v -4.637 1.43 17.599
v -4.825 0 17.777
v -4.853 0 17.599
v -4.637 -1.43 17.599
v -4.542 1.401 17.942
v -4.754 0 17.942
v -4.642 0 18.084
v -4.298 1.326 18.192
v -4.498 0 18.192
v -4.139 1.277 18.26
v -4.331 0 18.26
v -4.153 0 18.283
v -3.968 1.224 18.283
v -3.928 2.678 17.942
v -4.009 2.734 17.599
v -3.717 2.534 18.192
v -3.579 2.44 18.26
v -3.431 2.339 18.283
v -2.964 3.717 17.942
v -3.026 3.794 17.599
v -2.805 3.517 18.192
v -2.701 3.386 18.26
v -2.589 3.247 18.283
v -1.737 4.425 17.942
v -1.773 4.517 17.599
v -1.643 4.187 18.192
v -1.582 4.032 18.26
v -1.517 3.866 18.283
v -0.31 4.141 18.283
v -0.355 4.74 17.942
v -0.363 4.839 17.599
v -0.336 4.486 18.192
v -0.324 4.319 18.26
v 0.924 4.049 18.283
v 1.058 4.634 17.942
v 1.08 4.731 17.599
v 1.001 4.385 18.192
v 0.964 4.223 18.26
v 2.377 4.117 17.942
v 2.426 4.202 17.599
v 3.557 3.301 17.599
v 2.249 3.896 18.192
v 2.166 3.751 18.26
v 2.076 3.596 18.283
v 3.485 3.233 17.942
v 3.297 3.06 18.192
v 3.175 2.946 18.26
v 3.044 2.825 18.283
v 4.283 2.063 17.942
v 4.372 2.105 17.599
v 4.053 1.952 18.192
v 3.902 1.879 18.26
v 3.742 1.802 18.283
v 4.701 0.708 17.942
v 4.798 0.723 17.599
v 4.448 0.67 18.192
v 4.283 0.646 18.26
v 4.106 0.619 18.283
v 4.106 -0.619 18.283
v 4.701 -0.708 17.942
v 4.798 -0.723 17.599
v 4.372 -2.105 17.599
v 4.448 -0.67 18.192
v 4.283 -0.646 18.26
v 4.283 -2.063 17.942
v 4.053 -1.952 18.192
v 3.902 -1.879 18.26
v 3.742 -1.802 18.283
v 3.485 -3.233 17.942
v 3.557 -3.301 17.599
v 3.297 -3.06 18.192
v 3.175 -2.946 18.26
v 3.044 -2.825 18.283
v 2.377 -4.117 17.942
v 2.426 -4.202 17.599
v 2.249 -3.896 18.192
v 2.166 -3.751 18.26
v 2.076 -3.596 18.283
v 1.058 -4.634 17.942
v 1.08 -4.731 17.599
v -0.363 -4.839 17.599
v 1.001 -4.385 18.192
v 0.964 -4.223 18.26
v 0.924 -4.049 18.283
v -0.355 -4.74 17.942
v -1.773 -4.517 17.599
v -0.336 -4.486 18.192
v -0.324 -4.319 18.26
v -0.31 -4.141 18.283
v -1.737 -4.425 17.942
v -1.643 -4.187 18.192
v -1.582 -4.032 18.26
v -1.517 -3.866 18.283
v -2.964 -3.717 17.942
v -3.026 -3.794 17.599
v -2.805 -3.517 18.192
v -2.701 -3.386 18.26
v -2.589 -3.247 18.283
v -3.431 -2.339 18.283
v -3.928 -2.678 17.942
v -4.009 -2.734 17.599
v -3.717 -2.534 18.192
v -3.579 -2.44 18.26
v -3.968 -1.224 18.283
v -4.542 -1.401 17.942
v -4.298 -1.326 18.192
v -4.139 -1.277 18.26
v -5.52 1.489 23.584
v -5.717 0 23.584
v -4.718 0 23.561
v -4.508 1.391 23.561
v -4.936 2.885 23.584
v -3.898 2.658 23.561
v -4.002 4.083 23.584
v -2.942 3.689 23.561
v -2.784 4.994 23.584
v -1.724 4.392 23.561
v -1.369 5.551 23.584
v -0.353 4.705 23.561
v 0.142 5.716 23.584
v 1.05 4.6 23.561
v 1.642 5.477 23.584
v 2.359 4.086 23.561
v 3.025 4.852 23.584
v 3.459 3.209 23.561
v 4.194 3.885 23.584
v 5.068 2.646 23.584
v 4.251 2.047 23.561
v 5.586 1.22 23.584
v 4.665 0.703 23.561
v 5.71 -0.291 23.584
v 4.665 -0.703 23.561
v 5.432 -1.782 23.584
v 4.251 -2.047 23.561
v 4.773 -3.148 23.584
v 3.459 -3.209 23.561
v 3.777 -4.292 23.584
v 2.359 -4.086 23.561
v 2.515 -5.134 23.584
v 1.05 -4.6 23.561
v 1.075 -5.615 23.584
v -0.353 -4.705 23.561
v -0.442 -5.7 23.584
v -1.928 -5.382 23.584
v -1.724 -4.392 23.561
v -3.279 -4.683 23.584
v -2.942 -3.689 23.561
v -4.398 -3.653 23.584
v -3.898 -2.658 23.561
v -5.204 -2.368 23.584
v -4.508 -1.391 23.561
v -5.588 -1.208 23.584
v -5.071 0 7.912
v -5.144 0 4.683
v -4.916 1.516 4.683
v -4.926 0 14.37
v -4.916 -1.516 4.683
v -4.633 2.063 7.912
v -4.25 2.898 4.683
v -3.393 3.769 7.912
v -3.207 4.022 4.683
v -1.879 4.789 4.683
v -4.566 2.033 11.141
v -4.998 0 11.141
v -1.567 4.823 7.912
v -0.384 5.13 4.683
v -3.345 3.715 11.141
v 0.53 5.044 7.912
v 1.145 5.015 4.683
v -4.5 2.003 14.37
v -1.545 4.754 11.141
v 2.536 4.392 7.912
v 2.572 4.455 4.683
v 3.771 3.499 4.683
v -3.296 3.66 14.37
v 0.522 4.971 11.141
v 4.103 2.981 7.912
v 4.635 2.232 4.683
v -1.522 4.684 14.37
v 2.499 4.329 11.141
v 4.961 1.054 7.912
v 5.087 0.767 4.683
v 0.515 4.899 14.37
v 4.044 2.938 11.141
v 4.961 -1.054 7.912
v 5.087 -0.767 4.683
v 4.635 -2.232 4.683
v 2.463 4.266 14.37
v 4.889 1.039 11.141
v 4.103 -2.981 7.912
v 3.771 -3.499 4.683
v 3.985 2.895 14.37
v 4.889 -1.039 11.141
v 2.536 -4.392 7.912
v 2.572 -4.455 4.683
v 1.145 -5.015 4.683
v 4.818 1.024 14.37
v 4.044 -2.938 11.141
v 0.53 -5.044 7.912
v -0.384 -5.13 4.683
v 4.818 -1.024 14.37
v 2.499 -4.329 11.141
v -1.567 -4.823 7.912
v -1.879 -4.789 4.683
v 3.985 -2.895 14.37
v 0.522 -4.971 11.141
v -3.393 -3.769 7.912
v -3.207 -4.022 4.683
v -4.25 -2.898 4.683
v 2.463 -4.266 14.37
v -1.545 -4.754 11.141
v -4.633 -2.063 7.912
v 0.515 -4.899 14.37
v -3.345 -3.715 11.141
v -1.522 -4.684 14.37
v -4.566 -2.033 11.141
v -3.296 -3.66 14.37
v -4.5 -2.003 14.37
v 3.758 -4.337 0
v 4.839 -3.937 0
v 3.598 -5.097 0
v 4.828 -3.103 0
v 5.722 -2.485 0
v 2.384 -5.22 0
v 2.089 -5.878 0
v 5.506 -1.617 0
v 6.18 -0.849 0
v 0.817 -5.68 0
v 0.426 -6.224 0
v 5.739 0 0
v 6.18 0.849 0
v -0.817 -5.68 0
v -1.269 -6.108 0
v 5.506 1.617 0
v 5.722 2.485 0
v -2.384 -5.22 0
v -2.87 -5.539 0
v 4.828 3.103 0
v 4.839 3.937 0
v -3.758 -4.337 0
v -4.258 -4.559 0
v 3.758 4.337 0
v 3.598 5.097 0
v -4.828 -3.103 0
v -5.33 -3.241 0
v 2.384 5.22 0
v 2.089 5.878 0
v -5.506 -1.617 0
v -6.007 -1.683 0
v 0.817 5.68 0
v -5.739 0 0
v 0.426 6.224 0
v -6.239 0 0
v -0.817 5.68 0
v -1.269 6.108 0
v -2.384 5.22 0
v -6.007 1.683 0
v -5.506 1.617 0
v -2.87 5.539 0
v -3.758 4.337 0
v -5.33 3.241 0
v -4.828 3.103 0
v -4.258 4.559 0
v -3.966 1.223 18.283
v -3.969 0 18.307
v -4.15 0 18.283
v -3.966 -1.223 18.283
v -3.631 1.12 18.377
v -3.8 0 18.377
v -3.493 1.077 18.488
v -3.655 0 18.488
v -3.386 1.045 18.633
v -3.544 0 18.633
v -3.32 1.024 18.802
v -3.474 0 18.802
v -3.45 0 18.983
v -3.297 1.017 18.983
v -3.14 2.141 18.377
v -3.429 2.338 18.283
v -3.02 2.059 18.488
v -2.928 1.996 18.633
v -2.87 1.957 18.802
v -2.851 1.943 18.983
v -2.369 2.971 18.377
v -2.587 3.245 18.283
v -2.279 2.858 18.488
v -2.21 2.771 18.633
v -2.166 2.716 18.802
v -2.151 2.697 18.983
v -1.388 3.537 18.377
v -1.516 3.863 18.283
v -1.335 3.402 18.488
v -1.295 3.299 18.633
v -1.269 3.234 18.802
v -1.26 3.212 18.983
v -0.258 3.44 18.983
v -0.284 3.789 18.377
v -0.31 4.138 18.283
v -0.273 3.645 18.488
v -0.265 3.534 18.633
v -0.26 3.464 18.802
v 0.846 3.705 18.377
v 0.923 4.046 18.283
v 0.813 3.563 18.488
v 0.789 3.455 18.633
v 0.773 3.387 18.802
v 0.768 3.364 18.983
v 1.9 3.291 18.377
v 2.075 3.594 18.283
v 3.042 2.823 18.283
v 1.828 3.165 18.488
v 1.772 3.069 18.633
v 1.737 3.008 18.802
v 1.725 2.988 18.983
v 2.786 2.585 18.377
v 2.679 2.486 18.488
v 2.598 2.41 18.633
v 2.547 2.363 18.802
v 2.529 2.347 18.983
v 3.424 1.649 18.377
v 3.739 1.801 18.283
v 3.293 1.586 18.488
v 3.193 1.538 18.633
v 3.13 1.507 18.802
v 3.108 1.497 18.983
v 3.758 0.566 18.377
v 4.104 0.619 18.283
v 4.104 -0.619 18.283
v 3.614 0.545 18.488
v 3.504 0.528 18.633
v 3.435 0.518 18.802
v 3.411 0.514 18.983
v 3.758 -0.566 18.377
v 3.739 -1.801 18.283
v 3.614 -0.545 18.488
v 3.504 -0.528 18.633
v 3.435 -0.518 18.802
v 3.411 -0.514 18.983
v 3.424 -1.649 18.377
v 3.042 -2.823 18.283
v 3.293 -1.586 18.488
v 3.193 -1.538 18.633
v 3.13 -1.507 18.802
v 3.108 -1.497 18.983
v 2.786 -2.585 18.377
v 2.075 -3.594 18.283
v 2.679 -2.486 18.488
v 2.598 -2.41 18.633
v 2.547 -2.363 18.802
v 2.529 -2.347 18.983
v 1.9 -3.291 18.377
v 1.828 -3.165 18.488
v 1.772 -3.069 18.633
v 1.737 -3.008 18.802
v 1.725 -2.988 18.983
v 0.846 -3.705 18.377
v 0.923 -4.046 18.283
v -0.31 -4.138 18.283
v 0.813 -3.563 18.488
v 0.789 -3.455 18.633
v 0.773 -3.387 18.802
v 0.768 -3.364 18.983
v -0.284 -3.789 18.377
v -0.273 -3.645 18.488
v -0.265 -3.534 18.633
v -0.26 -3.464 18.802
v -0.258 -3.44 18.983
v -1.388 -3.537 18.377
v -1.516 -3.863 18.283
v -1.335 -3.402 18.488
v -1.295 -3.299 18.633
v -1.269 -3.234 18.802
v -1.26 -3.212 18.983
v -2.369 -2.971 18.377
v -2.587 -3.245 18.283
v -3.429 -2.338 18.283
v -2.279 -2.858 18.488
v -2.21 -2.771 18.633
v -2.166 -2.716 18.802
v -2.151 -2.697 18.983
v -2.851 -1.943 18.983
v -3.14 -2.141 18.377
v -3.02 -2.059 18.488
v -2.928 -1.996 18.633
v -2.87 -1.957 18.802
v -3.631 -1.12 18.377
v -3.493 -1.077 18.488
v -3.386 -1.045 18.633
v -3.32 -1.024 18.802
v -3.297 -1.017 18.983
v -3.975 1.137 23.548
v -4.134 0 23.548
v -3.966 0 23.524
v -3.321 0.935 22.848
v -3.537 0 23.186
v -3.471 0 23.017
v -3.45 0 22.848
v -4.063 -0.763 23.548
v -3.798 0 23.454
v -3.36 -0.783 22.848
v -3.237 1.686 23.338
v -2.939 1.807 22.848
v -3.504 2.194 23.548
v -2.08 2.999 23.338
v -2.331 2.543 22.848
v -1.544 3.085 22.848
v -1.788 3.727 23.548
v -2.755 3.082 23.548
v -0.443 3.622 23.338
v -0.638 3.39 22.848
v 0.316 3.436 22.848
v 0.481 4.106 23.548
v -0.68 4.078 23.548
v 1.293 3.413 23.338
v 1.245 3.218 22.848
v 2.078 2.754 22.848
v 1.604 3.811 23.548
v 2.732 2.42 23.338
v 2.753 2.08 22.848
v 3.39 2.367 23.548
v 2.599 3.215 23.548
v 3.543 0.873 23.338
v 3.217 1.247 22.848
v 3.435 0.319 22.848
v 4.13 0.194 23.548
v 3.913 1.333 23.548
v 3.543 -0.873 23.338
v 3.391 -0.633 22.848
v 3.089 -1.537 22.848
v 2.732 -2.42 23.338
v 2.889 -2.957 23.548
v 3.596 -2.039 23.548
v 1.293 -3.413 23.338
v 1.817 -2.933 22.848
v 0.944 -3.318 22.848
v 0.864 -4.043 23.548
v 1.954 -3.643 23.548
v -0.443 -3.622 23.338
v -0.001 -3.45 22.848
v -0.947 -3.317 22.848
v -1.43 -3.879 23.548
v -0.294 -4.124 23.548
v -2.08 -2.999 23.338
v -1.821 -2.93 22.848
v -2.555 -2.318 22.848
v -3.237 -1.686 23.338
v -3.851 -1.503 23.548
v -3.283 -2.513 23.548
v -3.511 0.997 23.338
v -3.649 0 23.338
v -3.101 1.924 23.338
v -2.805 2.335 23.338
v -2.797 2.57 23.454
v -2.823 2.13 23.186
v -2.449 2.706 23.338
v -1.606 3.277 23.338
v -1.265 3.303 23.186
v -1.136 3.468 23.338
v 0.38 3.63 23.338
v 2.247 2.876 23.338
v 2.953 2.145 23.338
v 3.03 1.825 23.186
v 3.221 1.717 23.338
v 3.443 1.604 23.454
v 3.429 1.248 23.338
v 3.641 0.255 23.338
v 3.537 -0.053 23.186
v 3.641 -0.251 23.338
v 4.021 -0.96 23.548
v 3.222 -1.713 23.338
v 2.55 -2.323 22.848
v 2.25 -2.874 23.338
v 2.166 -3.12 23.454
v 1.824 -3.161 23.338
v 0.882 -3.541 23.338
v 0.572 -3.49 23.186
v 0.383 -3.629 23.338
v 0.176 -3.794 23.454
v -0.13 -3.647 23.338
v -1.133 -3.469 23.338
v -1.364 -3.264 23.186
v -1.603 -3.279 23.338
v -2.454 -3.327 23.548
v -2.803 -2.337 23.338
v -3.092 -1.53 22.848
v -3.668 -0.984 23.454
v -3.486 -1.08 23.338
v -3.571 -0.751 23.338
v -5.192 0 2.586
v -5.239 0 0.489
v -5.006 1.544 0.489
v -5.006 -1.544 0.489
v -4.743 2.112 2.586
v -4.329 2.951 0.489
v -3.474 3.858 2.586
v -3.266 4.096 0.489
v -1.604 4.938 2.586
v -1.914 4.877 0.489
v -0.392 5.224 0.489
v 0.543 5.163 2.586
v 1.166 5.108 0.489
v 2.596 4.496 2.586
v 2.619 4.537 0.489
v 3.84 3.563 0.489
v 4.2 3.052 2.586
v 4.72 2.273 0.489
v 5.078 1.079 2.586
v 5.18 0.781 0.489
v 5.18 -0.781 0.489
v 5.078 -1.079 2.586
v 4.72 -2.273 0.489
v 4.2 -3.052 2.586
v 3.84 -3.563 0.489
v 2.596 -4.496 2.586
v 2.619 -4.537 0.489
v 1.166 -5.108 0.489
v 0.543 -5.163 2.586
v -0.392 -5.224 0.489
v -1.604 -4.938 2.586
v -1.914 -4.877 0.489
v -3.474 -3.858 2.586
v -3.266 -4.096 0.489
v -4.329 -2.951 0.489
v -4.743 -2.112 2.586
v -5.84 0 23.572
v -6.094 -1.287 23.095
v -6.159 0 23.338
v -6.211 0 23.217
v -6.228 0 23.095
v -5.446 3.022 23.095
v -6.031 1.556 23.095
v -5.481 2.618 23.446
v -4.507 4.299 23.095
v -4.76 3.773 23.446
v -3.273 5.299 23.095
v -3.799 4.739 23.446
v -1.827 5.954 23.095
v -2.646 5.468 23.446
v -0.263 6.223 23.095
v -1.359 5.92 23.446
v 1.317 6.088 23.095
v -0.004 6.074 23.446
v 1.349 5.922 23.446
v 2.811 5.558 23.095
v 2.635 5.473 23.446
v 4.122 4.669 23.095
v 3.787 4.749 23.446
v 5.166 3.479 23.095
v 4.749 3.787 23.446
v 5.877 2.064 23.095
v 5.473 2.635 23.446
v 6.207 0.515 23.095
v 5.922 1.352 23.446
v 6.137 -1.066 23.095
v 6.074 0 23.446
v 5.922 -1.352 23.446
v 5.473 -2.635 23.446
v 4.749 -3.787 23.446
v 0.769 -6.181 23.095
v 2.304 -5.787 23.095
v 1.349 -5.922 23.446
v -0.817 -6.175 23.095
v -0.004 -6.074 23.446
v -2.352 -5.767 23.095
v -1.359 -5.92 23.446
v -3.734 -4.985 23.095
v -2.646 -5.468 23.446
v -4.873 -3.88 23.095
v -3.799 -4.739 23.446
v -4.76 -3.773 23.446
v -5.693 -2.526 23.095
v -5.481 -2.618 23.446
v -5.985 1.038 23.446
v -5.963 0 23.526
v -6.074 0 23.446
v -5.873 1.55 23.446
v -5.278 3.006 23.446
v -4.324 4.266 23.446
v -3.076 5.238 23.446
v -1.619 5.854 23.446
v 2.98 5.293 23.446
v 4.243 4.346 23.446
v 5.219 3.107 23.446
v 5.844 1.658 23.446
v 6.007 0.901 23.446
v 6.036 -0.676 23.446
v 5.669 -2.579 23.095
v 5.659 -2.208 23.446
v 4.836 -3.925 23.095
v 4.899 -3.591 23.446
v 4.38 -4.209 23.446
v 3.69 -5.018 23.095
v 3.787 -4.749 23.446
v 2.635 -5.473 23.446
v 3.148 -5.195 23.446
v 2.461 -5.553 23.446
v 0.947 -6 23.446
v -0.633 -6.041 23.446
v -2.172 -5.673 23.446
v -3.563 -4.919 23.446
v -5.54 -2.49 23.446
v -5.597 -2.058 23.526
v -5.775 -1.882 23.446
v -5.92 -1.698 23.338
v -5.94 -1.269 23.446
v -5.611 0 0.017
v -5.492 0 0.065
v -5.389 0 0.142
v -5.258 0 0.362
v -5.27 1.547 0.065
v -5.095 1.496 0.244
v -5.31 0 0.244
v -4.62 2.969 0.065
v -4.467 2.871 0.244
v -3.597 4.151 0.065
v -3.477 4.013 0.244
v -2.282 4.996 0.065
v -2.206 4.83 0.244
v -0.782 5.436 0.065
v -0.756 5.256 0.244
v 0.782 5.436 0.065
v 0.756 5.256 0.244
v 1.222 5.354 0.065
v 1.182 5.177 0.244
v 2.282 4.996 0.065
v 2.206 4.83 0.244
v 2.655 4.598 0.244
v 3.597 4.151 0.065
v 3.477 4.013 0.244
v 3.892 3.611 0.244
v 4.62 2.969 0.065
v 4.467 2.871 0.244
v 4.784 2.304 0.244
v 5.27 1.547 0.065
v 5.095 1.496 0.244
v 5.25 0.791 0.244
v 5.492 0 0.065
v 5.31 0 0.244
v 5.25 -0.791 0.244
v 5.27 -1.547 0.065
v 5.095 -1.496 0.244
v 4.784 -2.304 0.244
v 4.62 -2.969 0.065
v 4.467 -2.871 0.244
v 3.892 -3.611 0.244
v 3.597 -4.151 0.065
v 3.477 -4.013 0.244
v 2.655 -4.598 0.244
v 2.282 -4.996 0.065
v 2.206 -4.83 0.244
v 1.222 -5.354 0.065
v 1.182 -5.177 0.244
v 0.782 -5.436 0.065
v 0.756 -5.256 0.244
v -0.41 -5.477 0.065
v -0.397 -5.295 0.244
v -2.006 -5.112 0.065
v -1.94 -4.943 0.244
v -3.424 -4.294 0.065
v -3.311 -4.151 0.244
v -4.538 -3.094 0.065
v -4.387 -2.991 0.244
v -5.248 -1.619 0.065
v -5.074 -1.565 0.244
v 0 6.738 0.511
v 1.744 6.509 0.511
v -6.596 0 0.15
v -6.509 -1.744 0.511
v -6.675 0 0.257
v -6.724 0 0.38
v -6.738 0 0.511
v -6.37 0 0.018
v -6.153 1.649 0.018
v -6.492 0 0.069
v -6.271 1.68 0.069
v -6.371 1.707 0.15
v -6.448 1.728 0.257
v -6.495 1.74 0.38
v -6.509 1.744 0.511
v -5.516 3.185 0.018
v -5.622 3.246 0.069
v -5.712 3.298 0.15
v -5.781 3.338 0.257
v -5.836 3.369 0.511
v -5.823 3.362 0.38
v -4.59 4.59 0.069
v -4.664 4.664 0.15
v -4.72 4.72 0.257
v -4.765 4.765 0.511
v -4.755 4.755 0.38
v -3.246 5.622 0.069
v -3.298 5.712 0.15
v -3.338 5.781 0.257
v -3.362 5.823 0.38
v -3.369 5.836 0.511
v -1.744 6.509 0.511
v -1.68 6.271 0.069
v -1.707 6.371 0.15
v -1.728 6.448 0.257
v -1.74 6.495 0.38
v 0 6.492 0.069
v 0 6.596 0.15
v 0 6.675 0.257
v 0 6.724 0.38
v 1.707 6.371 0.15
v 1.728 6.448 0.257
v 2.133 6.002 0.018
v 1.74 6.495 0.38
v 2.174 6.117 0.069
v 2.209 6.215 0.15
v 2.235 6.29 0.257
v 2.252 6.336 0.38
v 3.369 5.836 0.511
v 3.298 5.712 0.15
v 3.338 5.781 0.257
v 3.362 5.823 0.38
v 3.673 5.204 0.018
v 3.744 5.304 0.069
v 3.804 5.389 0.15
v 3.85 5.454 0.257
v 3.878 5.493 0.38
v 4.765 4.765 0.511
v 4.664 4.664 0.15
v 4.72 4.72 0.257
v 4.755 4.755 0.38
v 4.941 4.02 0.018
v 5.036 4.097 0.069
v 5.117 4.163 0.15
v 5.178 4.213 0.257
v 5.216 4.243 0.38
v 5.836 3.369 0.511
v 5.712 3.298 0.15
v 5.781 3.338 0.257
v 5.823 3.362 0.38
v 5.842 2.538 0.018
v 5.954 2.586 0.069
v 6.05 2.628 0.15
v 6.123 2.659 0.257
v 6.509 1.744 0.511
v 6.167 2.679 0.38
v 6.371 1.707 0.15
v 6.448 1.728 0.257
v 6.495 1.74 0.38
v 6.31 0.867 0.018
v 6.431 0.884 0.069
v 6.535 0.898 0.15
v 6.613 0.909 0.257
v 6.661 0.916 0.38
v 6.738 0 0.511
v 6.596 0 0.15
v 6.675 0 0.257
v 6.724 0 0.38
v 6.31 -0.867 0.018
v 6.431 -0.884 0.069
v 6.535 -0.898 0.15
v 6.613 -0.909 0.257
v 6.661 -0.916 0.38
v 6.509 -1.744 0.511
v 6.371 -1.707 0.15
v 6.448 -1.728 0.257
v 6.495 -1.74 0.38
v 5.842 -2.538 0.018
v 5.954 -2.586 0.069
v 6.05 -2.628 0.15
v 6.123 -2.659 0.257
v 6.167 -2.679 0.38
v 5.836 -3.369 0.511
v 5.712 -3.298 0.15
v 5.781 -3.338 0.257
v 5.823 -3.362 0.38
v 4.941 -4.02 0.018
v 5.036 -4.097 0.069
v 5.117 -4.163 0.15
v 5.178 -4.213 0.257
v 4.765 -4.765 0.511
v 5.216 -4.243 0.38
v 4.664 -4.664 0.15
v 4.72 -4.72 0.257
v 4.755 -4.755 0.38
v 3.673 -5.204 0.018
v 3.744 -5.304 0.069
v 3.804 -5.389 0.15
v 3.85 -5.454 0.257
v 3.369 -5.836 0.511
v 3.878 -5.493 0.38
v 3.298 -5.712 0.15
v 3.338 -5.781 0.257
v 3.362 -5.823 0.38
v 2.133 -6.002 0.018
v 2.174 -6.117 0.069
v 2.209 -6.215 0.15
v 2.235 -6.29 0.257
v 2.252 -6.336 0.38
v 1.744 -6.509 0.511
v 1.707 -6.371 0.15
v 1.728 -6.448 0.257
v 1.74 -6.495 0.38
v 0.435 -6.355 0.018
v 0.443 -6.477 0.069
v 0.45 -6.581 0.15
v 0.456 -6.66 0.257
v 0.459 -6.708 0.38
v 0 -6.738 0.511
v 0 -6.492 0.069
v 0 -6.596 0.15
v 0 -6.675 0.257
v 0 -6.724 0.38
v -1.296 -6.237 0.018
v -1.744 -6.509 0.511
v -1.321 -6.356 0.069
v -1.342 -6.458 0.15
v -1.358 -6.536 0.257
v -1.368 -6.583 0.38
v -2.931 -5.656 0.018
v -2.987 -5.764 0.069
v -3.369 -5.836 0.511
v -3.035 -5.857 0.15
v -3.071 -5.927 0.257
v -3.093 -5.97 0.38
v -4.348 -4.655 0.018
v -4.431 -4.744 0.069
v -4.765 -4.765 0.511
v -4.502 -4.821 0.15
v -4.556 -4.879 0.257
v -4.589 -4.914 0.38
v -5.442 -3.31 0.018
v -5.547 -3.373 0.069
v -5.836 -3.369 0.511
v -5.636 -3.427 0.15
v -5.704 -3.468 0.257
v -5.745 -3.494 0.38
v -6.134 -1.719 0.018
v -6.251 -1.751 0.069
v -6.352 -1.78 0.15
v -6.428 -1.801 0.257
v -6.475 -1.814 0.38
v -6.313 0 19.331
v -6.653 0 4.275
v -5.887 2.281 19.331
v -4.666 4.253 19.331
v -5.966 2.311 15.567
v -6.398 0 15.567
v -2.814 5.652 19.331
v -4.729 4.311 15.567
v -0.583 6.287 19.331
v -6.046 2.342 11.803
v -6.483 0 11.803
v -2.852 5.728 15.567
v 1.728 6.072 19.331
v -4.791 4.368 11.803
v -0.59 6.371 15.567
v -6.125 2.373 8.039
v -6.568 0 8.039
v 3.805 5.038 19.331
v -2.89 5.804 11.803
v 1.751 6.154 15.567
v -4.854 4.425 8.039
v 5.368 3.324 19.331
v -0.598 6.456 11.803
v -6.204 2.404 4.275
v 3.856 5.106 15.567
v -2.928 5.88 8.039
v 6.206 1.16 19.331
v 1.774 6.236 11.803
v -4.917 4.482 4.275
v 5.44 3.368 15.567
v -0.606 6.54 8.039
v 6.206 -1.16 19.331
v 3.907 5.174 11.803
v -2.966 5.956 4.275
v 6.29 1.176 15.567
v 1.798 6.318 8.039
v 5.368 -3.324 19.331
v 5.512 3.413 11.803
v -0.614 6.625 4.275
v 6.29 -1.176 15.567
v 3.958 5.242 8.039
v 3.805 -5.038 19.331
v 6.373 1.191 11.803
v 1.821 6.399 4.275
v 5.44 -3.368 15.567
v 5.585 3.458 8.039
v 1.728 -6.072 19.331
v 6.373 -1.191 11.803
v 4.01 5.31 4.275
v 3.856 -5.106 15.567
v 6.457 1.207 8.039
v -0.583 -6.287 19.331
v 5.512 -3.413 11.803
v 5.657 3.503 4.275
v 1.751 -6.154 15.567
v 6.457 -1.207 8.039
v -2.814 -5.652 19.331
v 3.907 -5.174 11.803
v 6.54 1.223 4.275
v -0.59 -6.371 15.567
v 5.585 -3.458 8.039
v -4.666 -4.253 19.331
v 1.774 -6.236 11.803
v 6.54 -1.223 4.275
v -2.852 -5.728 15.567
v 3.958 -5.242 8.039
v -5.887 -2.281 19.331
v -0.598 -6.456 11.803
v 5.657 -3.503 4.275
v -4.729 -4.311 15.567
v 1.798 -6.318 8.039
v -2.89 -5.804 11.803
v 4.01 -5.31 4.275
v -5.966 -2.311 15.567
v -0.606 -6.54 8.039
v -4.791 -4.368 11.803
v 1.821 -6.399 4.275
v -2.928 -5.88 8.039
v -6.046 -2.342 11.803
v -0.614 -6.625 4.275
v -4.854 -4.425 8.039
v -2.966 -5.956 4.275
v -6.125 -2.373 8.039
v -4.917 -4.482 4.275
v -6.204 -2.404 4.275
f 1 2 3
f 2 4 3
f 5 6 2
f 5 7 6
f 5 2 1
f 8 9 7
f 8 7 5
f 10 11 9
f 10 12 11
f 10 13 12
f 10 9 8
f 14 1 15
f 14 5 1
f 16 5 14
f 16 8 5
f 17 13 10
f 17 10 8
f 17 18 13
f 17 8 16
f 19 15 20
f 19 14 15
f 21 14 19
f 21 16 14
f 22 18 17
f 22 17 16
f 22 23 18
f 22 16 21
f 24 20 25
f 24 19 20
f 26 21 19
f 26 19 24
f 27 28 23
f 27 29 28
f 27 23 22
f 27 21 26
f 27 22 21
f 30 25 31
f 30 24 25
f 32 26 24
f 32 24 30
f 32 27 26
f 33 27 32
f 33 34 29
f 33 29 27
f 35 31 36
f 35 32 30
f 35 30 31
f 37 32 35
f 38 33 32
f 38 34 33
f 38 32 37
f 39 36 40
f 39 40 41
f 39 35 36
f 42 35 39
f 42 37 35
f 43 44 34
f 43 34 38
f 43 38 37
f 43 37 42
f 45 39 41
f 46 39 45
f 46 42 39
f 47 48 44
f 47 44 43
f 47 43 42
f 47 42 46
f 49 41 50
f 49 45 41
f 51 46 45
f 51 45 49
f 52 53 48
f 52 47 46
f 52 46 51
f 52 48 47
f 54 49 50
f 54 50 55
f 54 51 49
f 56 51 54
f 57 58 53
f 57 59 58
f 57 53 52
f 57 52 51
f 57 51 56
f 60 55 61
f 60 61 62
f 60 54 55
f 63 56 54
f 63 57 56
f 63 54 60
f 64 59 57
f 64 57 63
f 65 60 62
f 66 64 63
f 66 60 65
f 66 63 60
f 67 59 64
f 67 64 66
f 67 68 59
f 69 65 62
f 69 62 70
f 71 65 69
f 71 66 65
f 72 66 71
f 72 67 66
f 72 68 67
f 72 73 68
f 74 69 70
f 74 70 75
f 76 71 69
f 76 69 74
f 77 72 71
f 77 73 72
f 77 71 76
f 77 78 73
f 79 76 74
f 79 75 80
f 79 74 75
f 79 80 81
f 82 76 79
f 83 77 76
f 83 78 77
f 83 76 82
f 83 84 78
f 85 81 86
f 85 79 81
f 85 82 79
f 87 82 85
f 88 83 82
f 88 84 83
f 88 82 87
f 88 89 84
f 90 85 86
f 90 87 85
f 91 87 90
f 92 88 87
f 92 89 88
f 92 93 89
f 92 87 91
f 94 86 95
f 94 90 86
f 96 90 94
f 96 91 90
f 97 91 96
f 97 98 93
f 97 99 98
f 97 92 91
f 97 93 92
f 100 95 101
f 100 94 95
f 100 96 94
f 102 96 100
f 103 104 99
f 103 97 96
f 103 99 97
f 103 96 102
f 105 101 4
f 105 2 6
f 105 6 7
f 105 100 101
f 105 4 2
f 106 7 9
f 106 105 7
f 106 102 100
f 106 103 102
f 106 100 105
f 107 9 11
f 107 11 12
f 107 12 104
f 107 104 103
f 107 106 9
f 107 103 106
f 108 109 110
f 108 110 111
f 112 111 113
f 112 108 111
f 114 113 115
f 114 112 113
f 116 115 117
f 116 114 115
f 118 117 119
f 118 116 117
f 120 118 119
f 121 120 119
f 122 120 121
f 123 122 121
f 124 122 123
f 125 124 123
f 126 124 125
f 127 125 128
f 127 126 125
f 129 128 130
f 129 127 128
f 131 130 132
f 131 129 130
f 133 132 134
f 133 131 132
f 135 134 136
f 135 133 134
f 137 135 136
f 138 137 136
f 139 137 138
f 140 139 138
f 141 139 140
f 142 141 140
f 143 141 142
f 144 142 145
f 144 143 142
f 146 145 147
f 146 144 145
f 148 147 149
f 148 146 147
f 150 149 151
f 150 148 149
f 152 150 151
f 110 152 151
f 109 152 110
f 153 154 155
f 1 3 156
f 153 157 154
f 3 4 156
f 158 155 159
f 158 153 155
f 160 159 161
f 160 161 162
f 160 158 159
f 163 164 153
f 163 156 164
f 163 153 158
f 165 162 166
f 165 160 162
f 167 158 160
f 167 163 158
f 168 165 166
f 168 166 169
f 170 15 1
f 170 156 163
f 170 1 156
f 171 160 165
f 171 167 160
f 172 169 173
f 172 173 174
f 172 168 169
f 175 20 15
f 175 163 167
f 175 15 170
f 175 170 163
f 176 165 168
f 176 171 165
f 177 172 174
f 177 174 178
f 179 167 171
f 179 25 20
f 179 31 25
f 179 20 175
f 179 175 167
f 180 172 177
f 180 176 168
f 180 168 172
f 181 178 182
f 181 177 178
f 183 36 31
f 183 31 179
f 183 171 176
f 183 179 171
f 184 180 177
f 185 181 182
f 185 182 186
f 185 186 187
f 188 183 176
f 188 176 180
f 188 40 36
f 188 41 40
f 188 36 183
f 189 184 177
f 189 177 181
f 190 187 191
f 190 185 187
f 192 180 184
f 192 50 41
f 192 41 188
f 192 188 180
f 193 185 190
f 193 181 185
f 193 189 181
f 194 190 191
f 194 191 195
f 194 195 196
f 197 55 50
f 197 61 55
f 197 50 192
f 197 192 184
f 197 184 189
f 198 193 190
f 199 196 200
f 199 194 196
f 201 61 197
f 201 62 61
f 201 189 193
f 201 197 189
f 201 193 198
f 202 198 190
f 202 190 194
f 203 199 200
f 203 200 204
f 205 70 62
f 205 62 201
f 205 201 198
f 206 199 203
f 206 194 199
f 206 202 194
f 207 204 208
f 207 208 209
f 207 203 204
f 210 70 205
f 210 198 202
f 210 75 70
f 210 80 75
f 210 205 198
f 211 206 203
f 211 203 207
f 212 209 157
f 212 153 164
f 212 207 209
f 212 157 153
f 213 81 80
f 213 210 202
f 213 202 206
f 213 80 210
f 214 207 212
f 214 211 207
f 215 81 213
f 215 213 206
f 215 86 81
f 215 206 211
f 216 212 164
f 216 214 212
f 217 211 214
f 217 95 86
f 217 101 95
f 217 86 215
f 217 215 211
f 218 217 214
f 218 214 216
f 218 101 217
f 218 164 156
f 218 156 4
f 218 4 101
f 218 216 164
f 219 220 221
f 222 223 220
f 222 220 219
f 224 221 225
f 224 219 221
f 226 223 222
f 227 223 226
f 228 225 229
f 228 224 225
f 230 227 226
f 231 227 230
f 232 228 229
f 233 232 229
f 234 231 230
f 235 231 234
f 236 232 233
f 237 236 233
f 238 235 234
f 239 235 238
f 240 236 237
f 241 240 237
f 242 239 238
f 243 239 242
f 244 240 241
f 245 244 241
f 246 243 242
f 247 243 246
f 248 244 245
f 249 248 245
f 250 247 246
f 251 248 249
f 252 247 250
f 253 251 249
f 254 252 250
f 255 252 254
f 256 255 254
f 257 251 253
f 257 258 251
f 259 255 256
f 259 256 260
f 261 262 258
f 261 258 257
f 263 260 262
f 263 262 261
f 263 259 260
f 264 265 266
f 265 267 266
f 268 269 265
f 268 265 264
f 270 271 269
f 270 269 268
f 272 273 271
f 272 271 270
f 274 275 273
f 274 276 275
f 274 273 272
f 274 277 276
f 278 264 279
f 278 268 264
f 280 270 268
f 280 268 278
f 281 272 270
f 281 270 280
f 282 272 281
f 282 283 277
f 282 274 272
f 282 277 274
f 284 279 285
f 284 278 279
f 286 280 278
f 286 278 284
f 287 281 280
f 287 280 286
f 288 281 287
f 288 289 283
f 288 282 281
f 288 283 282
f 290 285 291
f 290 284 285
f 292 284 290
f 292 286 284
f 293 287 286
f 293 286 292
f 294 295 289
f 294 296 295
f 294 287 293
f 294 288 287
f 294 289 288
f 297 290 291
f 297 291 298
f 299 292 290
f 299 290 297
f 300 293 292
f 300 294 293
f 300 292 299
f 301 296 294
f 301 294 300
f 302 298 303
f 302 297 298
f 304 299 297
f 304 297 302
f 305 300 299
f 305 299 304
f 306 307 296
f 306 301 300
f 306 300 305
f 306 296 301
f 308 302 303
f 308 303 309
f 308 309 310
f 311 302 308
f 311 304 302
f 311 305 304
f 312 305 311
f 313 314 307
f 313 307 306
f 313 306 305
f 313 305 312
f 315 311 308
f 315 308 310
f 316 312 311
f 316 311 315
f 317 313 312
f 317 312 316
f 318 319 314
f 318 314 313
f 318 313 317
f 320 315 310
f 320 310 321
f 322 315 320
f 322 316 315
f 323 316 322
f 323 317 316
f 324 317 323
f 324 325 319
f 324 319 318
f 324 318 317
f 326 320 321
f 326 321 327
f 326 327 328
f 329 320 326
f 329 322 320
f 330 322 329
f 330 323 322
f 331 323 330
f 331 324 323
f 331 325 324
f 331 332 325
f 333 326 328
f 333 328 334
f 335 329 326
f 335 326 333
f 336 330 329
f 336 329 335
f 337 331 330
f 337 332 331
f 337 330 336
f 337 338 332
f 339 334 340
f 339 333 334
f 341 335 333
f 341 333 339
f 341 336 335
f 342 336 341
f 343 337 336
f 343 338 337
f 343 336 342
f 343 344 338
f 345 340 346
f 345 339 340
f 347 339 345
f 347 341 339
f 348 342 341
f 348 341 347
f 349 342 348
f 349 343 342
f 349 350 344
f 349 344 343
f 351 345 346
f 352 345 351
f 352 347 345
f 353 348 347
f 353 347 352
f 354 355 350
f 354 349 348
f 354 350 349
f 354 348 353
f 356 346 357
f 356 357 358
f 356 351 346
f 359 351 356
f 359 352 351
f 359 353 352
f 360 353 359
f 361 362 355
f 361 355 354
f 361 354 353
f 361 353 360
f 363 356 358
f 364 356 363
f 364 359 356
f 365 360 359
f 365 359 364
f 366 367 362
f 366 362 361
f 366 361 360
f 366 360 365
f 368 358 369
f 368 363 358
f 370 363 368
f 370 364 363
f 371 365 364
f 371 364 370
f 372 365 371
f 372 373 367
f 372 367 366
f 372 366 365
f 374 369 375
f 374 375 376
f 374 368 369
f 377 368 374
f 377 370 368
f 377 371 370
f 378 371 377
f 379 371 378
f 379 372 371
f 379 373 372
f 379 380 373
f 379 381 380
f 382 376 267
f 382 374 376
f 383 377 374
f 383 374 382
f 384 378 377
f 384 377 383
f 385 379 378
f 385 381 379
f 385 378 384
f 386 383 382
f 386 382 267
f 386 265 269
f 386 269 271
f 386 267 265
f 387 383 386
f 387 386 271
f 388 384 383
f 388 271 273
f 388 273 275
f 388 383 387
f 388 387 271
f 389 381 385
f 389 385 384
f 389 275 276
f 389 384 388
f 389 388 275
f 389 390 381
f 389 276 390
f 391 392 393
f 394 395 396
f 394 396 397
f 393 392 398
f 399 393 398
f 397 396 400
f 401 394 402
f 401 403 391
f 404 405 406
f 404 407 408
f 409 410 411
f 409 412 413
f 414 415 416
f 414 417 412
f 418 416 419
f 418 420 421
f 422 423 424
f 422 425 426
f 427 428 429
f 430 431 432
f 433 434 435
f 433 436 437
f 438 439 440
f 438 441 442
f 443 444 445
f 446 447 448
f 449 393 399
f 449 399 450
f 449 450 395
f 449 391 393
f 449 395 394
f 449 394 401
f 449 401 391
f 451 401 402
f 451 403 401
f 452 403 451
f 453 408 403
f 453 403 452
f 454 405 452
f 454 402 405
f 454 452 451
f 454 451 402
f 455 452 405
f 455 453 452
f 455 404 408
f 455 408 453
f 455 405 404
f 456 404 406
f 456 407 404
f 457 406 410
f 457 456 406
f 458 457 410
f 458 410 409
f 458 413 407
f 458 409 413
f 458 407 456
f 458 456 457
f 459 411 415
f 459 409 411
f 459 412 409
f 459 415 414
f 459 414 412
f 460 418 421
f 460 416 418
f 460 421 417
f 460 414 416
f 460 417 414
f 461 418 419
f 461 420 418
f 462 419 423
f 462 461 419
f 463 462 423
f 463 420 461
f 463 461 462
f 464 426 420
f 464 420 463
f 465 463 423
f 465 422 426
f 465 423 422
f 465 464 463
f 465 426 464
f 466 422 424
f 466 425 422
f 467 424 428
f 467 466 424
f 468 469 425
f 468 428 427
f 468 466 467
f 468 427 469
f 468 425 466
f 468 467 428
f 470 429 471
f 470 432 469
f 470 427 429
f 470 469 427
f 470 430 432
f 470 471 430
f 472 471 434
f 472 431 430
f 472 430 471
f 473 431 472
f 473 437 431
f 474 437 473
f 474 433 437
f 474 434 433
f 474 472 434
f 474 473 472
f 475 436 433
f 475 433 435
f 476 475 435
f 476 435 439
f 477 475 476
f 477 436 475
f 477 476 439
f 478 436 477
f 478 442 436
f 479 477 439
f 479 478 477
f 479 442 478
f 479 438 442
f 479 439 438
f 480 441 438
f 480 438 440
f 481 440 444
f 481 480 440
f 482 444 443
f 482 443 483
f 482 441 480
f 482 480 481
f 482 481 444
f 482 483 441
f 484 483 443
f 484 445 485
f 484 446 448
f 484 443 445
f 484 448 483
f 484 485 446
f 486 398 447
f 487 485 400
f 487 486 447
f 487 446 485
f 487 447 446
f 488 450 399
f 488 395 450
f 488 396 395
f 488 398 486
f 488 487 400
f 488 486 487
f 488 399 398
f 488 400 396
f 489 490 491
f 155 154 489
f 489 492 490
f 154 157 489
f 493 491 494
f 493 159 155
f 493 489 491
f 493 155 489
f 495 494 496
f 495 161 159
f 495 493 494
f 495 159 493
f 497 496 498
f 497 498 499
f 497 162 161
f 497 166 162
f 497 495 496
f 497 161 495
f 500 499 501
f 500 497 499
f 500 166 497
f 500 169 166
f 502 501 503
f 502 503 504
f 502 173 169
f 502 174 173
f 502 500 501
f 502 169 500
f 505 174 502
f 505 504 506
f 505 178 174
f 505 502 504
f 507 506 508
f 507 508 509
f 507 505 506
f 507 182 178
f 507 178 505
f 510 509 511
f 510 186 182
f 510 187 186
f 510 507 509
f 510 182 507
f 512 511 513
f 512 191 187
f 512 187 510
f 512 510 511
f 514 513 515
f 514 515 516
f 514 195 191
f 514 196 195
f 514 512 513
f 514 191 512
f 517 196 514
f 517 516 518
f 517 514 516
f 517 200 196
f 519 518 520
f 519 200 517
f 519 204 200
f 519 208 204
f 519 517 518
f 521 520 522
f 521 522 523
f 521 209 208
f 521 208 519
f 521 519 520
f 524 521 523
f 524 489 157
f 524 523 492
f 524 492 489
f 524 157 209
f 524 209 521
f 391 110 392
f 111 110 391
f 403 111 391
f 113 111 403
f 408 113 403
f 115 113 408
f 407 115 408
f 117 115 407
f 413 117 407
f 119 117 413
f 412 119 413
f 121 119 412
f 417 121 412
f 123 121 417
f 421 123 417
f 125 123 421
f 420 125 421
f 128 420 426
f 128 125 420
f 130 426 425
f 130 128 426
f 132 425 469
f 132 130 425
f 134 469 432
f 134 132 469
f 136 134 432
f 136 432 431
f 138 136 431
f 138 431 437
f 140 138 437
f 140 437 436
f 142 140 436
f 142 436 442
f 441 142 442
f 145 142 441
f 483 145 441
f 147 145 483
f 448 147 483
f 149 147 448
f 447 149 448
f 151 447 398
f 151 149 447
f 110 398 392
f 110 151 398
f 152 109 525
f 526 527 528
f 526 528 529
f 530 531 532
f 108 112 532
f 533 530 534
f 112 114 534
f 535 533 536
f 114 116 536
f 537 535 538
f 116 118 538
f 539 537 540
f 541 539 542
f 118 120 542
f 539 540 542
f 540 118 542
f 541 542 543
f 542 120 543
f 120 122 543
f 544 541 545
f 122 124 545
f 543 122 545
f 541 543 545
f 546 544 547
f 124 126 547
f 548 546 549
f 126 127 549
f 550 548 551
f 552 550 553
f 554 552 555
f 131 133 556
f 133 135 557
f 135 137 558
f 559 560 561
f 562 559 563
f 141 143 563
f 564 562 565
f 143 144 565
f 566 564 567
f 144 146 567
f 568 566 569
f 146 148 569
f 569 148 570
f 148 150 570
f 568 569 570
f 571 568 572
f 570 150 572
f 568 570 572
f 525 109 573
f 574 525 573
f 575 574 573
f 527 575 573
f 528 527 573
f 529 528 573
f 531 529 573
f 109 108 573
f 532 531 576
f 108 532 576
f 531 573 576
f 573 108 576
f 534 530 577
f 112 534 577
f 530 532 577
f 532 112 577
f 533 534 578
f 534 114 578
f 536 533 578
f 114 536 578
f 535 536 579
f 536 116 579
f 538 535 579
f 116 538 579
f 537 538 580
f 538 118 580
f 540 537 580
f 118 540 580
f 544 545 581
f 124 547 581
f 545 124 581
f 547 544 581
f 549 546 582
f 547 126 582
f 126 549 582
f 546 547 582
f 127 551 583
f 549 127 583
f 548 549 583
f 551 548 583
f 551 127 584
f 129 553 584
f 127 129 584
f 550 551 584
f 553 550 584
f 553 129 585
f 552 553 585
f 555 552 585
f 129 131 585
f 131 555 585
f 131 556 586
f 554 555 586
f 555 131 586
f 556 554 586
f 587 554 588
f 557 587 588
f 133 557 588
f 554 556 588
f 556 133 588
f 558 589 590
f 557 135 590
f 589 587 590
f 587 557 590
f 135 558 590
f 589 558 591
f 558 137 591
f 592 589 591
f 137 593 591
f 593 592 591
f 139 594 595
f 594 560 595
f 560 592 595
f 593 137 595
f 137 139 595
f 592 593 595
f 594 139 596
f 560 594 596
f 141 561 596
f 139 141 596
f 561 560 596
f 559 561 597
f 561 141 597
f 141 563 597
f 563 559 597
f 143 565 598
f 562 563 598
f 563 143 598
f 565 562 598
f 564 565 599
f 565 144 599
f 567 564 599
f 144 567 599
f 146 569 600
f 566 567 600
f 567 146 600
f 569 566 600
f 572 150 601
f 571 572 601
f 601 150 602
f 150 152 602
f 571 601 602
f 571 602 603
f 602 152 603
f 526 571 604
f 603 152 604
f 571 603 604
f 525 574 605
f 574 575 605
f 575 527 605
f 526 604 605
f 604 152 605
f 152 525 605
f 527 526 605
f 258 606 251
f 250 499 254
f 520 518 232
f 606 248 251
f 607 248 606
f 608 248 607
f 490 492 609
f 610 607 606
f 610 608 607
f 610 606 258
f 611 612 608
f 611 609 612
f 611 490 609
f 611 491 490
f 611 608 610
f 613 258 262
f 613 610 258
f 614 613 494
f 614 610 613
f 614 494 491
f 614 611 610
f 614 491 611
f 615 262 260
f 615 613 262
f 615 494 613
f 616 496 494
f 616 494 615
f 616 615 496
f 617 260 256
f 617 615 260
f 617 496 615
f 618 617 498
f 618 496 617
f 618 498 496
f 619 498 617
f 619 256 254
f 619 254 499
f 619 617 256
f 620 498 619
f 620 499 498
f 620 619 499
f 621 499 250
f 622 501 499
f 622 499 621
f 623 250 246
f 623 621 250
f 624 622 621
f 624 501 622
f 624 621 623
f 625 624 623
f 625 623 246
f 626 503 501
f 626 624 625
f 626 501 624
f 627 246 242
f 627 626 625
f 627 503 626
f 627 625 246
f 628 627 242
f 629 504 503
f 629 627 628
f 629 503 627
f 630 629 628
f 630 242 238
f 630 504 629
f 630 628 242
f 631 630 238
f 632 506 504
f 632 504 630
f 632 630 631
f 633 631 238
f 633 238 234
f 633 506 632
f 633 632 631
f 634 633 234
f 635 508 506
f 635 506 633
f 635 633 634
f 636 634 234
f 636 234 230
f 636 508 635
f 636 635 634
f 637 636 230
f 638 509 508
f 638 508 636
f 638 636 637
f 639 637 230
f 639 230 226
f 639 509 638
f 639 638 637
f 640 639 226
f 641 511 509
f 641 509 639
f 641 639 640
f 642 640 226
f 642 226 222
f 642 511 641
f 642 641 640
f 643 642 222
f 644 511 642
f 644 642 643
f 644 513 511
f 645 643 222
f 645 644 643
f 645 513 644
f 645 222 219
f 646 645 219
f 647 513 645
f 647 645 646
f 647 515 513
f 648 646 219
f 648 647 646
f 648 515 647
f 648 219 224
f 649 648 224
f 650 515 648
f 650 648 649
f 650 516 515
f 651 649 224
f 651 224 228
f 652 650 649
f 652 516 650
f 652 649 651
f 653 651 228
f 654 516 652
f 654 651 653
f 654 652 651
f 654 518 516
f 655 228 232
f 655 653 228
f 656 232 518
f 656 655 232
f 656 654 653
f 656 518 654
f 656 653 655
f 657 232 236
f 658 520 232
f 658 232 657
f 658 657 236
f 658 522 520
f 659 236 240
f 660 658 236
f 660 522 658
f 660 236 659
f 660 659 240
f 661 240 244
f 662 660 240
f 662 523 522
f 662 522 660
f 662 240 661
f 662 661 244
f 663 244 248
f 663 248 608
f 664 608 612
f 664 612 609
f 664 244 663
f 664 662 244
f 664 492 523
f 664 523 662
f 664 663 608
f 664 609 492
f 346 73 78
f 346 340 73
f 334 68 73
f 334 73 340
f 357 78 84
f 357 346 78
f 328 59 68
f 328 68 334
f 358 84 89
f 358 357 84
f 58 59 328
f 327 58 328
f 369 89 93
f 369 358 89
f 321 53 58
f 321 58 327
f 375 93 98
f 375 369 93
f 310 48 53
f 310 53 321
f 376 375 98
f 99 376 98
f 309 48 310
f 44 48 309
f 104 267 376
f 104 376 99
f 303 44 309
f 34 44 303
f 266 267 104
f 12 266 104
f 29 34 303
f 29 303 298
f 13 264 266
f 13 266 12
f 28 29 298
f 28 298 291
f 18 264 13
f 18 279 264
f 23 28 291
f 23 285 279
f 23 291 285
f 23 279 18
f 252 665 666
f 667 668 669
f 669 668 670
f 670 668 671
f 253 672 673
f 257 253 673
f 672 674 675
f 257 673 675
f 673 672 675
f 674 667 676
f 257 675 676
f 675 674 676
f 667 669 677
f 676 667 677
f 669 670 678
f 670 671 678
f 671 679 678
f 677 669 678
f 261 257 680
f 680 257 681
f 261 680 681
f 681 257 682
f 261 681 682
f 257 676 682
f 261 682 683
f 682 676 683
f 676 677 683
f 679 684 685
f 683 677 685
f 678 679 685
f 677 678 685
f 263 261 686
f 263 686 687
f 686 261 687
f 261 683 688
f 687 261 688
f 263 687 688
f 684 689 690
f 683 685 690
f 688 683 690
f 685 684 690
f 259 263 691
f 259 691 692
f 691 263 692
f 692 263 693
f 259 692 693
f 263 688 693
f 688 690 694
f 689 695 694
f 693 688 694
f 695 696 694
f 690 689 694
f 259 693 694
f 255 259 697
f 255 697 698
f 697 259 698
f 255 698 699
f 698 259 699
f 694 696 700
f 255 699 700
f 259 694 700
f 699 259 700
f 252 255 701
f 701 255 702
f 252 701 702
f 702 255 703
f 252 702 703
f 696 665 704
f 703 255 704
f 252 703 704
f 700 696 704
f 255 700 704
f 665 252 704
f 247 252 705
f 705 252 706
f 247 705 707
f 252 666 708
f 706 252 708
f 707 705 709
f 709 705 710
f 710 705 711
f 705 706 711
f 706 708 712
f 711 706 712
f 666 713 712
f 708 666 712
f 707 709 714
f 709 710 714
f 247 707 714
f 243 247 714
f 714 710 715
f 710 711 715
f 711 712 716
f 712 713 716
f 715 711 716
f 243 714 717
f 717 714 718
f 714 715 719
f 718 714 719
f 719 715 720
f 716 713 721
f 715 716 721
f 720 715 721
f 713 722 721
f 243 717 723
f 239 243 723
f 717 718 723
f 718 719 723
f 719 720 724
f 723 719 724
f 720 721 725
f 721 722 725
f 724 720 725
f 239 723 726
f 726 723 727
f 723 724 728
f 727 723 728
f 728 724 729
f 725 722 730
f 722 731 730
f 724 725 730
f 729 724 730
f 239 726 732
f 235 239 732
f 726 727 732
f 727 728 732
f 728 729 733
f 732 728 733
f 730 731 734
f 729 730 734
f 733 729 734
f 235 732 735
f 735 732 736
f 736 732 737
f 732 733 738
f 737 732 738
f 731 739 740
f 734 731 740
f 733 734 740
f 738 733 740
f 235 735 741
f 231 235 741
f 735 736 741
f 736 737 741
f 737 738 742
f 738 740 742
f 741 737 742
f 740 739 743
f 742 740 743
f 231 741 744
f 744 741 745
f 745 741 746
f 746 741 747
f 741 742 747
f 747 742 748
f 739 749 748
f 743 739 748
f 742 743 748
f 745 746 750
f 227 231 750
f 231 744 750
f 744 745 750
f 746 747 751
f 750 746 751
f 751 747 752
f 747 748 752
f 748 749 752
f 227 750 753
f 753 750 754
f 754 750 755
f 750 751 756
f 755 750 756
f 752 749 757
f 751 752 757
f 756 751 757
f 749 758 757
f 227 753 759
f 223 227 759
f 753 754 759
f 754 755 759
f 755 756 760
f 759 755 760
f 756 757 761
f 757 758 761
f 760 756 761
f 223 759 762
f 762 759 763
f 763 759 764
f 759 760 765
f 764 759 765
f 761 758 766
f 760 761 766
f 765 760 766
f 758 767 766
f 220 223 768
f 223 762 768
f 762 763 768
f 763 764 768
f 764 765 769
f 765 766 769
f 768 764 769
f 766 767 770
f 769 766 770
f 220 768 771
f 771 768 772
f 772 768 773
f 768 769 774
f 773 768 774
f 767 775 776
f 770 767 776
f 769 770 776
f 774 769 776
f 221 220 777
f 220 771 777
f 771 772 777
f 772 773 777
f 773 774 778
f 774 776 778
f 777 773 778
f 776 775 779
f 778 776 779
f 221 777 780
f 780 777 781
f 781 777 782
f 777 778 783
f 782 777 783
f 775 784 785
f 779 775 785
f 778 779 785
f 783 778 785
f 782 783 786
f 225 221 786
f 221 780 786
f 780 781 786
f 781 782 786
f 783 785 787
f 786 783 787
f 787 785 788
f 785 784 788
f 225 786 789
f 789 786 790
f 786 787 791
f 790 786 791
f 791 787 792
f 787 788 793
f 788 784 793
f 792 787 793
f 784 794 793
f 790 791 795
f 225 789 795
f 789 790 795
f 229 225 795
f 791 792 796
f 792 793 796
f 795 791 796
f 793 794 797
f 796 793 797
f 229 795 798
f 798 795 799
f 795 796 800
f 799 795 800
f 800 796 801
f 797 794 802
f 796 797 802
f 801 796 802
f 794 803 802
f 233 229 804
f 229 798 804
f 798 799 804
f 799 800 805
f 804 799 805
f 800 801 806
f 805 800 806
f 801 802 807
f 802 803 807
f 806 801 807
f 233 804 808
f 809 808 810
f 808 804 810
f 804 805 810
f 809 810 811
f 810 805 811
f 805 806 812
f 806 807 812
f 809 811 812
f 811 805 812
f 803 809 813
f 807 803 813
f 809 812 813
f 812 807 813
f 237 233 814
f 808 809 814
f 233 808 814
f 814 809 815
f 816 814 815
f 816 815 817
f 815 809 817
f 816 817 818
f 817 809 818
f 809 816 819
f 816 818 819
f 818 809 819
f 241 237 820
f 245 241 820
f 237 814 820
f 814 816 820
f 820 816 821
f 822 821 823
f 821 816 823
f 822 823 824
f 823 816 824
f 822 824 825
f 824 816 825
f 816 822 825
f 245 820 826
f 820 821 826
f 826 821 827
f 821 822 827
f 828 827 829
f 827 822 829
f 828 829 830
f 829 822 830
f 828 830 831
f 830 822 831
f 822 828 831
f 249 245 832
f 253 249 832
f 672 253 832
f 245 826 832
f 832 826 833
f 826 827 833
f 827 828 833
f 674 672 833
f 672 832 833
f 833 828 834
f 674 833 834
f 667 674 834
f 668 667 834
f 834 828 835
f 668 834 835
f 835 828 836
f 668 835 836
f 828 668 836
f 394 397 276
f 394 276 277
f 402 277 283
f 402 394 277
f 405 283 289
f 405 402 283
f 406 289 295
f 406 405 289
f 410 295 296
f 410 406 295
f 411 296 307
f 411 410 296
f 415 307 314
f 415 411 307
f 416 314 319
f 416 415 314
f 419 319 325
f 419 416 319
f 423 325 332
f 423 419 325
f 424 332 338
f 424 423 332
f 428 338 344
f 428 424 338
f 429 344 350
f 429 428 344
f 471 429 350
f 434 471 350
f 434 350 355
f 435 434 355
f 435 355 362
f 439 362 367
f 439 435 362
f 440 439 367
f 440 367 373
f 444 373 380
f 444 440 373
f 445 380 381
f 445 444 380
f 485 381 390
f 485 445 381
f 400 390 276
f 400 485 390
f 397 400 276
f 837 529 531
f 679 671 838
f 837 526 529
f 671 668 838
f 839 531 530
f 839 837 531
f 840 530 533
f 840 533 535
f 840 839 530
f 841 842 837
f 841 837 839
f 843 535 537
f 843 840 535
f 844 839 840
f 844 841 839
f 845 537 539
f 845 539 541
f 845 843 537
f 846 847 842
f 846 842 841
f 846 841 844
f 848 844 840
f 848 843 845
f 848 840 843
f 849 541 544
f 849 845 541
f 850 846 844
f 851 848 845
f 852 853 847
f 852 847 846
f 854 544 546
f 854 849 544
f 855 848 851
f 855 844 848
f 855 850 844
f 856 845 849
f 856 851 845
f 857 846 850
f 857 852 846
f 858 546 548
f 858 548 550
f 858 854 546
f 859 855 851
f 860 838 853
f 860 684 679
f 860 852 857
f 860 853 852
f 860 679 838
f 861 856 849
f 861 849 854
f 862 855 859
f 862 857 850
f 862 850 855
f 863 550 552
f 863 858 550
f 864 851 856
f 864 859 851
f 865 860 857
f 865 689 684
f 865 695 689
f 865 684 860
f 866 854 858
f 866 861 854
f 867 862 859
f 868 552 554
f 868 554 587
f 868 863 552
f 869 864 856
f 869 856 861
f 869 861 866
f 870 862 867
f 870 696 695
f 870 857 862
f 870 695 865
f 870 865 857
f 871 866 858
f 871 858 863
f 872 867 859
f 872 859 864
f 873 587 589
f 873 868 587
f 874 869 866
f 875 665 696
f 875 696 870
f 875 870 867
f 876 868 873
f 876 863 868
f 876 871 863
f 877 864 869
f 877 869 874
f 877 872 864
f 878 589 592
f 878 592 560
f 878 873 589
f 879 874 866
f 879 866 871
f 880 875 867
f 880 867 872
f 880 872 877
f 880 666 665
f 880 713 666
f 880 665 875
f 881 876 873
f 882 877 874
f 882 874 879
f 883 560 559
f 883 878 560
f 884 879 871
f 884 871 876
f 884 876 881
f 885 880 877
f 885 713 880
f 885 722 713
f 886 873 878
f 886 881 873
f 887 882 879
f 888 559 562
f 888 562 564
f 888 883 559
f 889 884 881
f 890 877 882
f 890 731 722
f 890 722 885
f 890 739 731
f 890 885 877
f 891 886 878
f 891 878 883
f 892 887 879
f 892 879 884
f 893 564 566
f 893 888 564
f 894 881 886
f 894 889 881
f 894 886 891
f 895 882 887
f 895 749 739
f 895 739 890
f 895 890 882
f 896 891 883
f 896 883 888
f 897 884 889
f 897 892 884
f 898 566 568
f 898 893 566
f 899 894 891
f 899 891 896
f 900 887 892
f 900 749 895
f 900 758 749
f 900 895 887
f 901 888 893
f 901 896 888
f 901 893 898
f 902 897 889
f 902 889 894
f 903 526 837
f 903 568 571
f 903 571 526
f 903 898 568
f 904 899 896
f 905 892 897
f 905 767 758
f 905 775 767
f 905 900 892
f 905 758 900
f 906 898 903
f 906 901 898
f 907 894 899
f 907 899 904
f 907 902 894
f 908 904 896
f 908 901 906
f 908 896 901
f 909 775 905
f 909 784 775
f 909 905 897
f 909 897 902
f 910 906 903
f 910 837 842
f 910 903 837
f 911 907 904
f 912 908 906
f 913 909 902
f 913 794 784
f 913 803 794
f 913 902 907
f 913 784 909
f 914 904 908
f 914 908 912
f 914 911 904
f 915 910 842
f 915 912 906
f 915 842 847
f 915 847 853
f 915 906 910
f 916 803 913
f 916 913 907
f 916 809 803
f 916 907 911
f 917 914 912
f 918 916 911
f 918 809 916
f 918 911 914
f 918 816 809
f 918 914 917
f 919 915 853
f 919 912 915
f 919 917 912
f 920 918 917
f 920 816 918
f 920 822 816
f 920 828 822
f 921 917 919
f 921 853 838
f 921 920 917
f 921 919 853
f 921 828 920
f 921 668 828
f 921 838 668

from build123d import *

# Parameters (mm, degrees)
F3_R = 0.5
F4_R = 0.7


with BuildPart() as f2:
    # F1 (on Front) → F2 (revolve)
    with BuildSketch(Plane.XZ):
        Polygon((-6.75, 0), (-5.25, 0), (-5.144249, 4.683239), (-4.837149, 18.283406), (-4.717968, 23.56143), (-6.217203, 23.595284), align=None)
        Polygon((-4.717968, 23.56143), (-4.837149, 18.283406), (-3.45, 18.283406), (-3.45, 23.532799), align=None)
    revolve(axis=Axis((0, 0, 1.148649), (0, 0, -1)))

    # F3
    f3_edges = [f2.edges().sort_by_distance(p)[0] for p in [
        (6.217203, 0, 23.595284),
        (6.75, 0, 0),
        (5.25, 0, 0),
    ]]
    fillet(f3_edges, radius=F3_R)

    # F4
    f4_edges = [f2.edges().sort_by_distance(p)[0] for p in [
        (3.45, 0, 18.283406),
        (3.45, 0, 23.532799),
        (-3.45, 0, 20.908103),
        (4.837149, 0, 18.283406),
    ]]
    fillet(f4_edges, radius=F4_R)


solid = f2.part
